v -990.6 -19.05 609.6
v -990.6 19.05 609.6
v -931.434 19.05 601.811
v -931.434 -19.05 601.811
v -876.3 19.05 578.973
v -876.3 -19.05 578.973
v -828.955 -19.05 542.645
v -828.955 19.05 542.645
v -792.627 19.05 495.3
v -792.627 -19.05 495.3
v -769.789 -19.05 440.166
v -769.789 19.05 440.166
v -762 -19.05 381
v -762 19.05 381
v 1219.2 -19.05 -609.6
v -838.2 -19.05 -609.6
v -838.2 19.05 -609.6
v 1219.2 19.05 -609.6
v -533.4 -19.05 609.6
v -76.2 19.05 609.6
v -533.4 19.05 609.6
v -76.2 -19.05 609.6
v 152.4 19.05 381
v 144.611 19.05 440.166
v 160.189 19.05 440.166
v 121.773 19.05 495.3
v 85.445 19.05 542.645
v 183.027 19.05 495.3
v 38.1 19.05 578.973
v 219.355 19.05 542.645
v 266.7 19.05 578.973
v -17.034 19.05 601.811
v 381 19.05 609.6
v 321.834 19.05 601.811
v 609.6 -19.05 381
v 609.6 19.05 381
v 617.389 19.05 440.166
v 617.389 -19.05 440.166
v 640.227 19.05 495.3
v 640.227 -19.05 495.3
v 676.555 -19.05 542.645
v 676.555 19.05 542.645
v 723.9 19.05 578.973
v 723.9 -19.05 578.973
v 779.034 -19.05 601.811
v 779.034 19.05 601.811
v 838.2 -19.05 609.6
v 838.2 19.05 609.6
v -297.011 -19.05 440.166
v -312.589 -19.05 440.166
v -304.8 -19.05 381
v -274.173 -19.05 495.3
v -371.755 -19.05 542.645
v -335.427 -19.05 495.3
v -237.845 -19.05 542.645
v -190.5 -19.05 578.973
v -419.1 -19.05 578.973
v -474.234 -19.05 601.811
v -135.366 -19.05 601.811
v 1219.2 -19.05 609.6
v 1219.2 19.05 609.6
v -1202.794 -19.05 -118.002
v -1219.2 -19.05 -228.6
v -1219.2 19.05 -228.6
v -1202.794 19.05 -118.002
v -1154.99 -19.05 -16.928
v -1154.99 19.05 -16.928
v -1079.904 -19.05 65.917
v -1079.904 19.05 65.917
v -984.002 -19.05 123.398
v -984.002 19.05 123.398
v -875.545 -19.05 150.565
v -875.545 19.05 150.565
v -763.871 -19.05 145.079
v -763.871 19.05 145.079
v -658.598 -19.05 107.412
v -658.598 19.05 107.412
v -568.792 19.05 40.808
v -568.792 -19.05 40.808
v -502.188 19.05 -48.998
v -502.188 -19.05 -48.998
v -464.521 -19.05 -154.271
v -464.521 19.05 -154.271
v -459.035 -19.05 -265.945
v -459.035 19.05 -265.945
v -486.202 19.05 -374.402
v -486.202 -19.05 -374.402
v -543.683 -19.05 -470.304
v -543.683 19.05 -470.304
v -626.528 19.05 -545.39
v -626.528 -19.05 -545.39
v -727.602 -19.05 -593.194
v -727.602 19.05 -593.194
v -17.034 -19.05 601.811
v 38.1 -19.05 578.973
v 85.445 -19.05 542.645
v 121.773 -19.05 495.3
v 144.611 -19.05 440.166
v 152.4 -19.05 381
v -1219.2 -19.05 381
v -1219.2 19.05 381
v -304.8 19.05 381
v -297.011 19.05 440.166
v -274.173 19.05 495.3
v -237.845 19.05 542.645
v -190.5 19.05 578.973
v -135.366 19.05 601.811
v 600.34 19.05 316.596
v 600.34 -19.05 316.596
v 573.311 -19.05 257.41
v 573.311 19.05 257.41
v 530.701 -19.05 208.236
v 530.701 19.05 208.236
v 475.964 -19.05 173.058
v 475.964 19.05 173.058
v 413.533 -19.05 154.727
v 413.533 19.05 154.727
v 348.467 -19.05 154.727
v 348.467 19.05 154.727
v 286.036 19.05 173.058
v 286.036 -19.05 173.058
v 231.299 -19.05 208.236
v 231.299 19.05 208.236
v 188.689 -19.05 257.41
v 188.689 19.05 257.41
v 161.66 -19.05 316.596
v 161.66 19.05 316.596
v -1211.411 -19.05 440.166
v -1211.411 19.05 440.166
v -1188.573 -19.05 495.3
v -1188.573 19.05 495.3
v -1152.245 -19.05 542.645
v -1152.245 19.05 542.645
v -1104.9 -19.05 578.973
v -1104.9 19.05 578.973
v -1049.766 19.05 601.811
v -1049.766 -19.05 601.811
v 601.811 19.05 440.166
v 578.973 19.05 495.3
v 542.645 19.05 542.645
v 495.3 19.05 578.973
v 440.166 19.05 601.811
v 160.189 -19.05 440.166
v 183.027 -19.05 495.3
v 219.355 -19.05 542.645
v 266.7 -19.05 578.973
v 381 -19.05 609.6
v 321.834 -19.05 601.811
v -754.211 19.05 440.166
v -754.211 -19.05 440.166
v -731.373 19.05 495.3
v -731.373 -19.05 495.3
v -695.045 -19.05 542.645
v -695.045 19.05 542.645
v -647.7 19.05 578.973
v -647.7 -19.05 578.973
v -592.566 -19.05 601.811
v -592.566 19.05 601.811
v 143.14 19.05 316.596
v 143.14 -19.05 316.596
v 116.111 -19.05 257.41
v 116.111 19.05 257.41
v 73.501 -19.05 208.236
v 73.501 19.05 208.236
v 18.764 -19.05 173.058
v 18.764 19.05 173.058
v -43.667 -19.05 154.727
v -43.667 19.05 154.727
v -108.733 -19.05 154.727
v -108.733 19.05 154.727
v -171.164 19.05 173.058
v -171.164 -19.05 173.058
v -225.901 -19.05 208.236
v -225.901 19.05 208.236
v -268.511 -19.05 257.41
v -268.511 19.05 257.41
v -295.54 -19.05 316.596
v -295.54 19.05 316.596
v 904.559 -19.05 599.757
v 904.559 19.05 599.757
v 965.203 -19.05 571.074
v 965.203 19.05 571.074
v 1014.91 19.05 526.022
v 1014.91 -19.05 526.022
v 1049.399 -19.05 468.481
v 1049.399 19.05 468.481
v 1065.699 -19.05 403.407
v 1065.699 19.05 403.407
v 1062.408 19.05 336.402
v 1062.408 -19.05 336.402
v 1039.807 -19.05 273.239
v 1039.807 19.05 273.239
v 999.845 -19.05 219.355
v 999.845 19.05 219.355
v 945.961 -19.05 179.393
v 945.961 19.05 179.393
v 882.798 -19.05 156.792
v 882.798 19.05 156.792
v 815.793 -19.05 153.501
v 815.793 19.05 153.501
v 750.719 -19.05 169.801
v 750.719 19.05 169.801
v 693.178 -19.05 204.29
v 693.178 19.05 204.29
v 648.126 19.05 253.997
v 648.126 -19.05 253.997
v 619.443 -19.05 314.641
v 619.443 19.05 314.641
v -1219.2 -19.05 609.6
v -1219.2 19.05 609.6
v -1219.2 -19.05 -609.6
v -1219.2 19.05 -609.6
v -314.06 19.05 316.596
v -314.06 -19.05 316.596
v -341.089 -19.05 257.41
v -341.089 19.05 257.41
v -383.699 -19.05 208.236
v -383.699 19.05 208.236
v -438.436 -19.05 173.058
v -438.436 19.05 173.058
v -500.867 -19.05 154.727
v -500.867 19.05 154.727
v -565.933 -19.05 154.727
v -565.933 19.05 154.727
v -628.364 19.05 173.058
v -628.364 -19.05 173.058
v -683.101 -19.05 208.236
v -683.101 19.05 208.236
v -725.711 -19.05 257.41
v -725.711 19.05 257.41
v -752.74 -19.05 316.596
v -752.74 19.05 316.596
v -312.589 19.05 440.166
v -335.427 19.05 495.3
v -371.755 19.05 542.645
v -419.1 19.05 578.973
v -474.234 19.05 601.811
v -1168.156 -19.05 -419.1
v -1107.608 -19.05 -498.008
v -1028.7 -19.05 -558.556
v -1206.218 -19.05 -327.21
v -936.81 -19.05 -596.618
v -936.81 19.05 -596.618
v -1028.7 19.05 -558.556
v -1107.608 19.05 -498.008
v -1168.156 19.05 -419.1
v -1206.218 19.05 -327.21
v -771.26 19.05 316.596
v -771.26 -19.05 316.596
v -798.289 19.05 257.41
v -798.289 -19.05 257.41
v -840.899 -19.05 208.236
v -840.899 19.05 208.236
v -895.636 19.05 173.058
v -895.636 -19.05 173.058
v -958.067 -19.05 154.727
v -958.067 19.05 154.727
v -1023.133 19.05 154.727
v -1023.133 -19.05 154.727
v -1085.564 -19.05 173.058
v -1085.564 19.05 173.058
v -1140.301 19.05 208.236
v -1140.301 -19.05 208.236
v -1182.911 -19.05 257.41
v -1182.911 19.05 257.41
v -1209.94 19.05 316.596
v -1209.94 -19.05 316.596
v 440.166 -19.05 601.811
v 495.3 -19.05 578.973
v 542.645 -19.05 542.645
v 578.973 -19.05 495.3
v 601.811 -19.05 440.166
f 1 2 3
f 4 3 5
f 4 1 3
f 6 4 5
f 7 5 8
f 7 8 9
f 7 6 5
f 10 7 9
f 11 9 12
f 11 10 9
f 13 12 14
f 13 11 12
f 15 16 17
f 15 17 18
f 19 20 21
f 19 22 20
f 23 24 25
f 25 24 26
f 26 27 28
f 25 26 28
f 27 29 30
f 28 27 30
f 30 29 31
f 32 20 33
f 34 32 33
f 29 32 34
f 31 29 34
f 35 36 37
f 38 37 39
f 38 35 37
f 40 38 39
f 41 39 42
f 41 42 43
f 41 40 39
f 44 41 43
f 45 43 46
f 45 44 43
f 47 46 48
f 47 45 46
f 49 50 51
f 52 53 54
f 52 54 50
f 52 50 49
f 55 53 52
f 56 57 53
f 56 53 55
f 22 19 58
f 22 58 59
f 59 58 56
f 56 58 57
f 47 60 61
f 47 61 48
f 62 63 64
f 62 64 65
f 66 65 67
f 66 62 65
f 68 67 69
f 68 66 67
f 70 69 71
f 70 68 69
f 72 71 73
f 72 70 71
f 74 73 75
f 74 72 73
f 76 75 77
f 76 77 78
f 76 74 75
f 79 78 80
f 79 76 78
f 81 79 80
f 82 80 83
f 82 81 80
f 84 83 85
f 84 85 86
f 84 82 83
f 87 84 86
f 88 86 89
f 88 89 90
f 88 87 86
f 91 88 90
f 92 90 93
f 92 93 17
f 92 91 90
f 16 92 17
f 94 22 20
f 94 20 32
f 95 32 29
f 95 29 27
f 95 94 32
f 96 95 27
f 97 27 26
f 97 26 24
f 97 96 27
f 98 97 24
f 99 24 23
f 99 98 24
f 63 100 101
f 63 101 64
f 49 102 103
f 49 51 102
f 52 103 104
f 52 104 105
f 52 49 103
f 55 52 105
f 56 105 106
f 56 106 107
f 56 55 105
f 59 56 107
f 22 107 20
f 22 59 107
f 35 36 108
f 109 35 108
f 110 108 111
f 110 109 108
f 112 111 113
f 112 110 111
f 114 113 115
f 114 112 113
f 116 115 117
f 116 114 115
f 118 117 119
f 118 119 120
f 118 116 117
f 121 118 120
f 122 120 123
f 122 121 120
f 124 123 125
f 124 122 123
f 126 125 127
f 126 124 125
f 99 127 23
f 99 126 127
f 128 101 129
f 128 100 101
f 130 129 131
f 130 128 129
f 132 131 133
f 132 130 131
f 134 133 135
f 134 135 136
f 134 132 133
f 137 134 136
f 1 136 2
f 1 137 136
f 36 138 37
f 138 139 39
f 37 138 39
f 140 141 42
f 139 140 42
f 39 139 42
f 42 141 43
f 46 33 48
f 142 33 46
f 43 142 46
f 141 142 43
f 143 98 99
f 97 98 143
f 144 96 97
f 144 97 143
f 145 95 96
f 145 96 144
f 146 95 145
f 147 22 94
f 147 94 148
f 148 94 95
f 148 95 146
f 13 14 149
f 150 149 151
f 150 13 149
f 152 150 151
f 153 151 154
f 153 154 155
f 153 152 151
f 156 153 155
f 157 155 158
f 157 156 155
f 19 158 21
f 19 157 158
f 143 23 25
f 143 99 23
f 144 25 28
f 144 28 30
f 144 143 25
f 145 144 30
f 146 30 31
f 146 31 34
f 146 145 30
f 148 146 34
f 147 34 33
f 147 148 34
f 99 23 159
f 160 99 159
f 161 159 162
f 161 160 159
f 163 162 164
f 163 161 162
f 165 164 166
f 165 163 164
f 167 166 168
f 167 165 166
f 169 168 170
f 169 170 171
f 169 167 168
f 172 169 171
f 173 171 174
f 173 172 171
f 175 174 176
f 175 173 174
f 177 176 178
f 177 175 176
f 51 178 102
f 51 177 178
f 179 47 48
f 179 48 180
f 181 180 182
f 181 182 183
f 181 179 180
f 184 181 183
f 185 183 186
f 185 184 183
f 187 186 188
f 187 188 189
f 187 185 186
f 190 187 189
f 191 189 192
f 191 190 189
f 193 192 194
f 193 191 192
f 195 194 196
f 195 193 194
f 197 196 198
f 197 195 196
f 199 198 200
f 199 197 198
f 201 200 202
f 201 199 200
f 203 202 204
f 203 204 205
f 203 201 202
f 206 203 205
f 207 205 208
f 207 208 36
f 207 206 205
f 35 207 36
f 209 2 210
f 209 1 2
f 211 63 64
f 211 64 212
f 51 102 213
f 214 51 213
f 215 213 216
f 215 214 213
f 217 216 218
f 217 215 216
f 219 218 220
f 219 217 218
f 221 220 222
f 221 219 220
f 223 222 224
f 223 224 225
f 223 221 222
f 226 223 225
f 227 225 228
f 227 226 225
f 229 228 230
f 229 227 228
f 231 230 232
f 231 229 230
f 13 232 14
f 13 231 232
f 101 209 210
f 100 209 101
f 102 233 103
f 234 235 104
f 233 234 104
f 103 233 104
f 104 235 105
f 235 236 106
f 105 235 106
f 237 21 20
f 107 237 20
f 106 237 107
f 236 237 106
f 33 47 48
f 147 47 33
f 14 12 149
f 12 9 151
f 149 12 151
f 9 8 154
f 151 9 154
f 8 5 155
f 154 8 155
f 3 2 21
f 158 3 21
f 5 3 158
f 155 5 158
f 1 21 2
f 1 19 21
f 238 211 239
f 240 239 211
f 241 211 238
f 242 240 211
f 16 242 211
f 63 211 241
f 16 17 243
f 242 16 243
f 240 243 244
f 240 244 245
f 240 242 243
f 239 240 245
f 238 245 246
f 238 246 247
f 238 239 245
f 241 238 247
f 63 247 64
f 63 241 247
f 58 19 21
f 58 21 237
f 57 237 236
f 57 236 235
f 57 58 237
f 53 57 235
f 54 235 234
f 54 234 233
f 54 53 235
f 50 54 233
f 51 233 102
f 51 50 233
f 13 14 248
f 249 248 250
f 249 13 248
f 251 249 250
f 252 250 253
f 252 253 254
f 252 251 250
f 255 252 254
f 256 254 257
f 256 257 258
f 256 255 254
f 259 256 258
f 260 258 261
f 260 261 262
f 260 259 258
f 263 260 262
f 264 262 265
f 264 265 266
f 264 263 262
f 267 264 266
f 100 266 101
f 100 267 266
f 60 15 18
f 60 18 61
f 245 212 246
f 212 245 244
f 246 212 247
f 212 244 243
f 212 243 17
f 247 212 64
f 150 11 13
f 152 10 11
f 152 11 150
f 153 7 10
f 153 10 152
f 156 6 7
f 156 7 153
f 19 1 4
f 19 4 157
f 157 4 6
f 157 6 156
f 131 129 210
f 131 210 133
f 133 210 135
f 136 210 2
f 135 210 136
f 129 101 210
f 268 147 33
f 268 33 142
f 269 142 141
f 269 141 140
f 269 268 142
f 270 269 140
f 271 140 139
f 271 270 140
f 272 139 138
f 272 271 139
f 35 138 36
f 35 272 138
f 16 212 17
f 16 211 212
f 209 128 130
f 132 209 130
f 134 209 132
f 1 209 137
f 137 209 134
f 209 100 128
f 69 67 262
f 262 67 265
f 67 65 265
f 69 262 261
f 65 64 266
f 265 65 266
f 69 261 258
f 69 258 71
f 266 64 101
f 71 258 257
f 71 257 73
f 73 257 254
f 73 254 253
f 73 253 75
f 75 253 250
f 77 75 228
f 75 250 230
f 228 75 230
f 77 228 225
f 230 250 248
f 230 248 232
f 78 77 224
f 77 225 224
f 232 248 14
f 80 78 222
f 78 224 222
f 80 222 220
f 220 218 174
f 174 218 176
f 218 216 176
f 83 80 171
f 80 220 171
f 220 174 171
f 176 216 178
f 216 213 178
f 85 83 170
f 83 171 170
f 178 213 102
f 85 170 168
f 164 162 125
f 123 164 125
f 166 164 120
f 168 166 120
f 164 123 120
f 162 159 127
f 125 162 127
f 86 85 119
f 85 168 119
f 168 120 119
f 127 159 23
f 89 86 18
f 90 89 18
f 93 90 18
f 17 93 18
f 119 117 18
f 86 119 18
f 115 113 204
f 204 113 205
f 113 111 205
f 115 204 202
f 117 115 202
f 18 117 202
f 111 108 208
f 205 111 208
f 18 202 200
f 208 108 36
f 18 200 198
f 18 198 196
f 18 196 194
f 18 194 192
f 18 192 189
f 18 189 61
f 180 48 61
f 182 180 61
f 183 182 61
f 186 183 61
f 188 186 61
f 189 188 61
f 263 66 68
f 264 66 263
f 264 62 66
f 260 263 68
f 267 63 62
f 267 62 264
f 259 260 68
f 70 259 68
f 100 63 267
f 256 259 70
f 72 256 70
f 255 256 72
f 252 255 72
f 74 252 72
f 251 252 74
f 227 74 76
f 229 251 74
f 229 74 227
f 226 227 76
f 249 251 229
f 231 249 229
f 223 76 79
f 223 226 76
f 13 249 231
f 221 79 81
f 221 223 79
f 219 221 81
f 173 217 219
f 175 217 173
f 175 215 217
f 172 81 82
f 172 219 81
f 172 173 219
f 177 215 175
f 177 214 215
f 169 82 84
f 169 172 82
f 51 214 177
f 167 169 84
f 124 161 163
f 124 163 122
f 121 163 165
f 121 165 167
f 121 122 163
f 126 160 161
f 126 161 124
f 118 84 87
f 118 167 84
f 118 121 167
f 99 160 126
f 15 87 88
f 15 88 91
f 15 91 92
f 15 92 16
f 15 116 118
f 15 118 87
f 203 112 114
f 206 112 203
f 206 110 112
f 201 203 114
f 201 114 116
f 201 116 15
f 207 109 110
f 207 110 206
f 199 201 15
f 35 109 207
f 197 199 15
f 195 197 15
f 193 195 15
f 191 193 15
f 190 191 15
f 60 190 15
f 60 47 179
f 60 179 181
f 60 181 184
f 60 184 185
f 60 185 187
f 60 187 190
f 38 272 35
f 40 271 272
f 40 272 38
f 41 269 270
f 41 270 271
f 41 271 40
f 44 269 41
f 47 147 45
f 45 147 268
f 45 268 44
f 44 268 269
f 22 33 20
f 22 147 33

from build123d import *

# Parameters (mm, degrees)
F1_DEPTH = 19.05


with BuildPart() as f1:
    # F0 (on Front) → F1 (new body, symmetric)
    with BuildSketch(Plane.XZ):
        with BuildLine():
            Line((-990.6, 609.6), (-1219.2, 609.6))
            Line((-1219.2, 609.6), (-1219.2, 381))
            ThreePointArc((-1219.2, 381), (-1152.2446101792, 542.6446101792), (-990.6, 609.6))
        make_face()
    extrude(amount=F1_DEPTH, both=True)


with BuildPart() as f1b:
    # F0 (on Front) → F1, piece 2 (new body, symmetric)
    with BuildSketch(Plane.XZ):
        with BuildLine():
            Line((-533.4, 609.6), (-990.6, 609.6))
            ThreePointArc((-990.6, 609.6), (-828.9553898208, 542.6446101792), (-762, 381))
            ThreePointArc((-762, 381), (-695.0446101792, 542.6446101792), (-533.4, 609.6))
        make_face()
    extrude(amount=F1_DEPTH, both=True)


with BuildPart() as f1c:
    # F0 (on Front) → F1, piece 3 (new body, symmetric)
    with BuildSketch(Plane.XZ):
        with BuildLine():
            Line((-76.2, 609.6), (-533.4, 609.6))
            ThreePointArc((-533.4, 609.6), (-371.7553898208, 542.6446101792), (-304.8, 381))
            ThreePointArc((-304.8, 381), (-237.8446101792, 542.6446101792), (-76.2, 609.6))
        make_face()
    extrude(amount=F1_DEPTH, both=True)


with BuildPart() as f1d:
    # F0 (on Front) → F1, piece 4 (new body, symmetric)
    with BuildSketch(Plane.XZ):
        with BuildLine():
            Line((381, 609.6), (-76.2, 609.6))
            ThreePointArc((-76.2, 609.6), (85.4446101792, 542.6446101792), (152.4, 381))
            ThreePointArc((152.4, 381), (219.3553898208, 542.6446101792), (381, 609.6))
        make_face()
    extrude(amount=F1_DEPTH, both=True)


with BuildPart() as f1e:
    # F0 (on Front) → F1, piece 5 (new body, symmetric)
    with BuildSketch(Plane.XZ):
        with BuildLine():
            Line((838.2, 609.6), (381, 609.6))
            ThreePointArc((381, 609.6), (542.6446101792, 542.6446101792), (609.6, 381))
            ThreePointArc((609.6, 381), (676.5553898208, 542.6446101792), (838.2, 609.6))
        make_face()
    extrude(amount=F1_DEPTH, both=True)


with BuildPart() as f1f:
    # F0 (on Front) → F1, piece 6 (new body, symmetric)
    with BuildSketch(Plane.XZ):
        with BuildLine():
            ThreePointArc((-762, 381), (-990.6, 152.4), (-1219.2, 381))
            Line((-1219.2, 381), (-1219.2, -228.6000010031))
            ThreePointArc((-1219.2, -228.6000010031), (-838.2000005016, 152.4), (-457.2, -228.6))
            ThreePointArc((-457.2, -228.6), (-568.7923163679, -498.0076836321), (-838.2, -609.6))
            Line((-838.2, -609.6), (1219.2, -609.6))
            Line((1219.2, -609.6), (1219.2, 609.6))
            Line((1219.2, 609.6), (838.2, 609.6))
            ThreePointArc((838.2, 609.6), (999.8446101792, 542.6446101792), (1066.8, 381))
            ThreePointArc((1066.8, 381), (838.2, 152.4), (609.6, 381))
            ThreePointArc((609.6, 381), (381, 152.4), (152.4, 381))
            ThreePointArc((152.4, 381), (-76.2, 152.4), (-304.8, 381))
            ThreePointArc((-304.8, 381), (-533.4, 152.4), (-762, 381))
        make_face()
    extrude(amount=F1_DEPTH, both=True)


with BuildPart() as f1g:
    # F0 (on Front) → F1, piece 7 (new body, symmetric)
    with BuildSketch(Plane.XZ):
        with BuildLine():
            ThreePointArc((-838.2, -609.6), (-1107.6076832774, -498.0076839867), (-1219.2, -228.6000010031))
            Line((-1219.2, -228.6000010031), (-1219.2, -609.6))
            Line((-1219.2, -609.6), (-838.2, -609.6))
        make_face()
    extrude(amount=F1_DEPTH, both=True)


solid = Compound([f1.part, f1b.part, f1c.part, f1d.part, f1e.part, f1f.part, f1g.part])
